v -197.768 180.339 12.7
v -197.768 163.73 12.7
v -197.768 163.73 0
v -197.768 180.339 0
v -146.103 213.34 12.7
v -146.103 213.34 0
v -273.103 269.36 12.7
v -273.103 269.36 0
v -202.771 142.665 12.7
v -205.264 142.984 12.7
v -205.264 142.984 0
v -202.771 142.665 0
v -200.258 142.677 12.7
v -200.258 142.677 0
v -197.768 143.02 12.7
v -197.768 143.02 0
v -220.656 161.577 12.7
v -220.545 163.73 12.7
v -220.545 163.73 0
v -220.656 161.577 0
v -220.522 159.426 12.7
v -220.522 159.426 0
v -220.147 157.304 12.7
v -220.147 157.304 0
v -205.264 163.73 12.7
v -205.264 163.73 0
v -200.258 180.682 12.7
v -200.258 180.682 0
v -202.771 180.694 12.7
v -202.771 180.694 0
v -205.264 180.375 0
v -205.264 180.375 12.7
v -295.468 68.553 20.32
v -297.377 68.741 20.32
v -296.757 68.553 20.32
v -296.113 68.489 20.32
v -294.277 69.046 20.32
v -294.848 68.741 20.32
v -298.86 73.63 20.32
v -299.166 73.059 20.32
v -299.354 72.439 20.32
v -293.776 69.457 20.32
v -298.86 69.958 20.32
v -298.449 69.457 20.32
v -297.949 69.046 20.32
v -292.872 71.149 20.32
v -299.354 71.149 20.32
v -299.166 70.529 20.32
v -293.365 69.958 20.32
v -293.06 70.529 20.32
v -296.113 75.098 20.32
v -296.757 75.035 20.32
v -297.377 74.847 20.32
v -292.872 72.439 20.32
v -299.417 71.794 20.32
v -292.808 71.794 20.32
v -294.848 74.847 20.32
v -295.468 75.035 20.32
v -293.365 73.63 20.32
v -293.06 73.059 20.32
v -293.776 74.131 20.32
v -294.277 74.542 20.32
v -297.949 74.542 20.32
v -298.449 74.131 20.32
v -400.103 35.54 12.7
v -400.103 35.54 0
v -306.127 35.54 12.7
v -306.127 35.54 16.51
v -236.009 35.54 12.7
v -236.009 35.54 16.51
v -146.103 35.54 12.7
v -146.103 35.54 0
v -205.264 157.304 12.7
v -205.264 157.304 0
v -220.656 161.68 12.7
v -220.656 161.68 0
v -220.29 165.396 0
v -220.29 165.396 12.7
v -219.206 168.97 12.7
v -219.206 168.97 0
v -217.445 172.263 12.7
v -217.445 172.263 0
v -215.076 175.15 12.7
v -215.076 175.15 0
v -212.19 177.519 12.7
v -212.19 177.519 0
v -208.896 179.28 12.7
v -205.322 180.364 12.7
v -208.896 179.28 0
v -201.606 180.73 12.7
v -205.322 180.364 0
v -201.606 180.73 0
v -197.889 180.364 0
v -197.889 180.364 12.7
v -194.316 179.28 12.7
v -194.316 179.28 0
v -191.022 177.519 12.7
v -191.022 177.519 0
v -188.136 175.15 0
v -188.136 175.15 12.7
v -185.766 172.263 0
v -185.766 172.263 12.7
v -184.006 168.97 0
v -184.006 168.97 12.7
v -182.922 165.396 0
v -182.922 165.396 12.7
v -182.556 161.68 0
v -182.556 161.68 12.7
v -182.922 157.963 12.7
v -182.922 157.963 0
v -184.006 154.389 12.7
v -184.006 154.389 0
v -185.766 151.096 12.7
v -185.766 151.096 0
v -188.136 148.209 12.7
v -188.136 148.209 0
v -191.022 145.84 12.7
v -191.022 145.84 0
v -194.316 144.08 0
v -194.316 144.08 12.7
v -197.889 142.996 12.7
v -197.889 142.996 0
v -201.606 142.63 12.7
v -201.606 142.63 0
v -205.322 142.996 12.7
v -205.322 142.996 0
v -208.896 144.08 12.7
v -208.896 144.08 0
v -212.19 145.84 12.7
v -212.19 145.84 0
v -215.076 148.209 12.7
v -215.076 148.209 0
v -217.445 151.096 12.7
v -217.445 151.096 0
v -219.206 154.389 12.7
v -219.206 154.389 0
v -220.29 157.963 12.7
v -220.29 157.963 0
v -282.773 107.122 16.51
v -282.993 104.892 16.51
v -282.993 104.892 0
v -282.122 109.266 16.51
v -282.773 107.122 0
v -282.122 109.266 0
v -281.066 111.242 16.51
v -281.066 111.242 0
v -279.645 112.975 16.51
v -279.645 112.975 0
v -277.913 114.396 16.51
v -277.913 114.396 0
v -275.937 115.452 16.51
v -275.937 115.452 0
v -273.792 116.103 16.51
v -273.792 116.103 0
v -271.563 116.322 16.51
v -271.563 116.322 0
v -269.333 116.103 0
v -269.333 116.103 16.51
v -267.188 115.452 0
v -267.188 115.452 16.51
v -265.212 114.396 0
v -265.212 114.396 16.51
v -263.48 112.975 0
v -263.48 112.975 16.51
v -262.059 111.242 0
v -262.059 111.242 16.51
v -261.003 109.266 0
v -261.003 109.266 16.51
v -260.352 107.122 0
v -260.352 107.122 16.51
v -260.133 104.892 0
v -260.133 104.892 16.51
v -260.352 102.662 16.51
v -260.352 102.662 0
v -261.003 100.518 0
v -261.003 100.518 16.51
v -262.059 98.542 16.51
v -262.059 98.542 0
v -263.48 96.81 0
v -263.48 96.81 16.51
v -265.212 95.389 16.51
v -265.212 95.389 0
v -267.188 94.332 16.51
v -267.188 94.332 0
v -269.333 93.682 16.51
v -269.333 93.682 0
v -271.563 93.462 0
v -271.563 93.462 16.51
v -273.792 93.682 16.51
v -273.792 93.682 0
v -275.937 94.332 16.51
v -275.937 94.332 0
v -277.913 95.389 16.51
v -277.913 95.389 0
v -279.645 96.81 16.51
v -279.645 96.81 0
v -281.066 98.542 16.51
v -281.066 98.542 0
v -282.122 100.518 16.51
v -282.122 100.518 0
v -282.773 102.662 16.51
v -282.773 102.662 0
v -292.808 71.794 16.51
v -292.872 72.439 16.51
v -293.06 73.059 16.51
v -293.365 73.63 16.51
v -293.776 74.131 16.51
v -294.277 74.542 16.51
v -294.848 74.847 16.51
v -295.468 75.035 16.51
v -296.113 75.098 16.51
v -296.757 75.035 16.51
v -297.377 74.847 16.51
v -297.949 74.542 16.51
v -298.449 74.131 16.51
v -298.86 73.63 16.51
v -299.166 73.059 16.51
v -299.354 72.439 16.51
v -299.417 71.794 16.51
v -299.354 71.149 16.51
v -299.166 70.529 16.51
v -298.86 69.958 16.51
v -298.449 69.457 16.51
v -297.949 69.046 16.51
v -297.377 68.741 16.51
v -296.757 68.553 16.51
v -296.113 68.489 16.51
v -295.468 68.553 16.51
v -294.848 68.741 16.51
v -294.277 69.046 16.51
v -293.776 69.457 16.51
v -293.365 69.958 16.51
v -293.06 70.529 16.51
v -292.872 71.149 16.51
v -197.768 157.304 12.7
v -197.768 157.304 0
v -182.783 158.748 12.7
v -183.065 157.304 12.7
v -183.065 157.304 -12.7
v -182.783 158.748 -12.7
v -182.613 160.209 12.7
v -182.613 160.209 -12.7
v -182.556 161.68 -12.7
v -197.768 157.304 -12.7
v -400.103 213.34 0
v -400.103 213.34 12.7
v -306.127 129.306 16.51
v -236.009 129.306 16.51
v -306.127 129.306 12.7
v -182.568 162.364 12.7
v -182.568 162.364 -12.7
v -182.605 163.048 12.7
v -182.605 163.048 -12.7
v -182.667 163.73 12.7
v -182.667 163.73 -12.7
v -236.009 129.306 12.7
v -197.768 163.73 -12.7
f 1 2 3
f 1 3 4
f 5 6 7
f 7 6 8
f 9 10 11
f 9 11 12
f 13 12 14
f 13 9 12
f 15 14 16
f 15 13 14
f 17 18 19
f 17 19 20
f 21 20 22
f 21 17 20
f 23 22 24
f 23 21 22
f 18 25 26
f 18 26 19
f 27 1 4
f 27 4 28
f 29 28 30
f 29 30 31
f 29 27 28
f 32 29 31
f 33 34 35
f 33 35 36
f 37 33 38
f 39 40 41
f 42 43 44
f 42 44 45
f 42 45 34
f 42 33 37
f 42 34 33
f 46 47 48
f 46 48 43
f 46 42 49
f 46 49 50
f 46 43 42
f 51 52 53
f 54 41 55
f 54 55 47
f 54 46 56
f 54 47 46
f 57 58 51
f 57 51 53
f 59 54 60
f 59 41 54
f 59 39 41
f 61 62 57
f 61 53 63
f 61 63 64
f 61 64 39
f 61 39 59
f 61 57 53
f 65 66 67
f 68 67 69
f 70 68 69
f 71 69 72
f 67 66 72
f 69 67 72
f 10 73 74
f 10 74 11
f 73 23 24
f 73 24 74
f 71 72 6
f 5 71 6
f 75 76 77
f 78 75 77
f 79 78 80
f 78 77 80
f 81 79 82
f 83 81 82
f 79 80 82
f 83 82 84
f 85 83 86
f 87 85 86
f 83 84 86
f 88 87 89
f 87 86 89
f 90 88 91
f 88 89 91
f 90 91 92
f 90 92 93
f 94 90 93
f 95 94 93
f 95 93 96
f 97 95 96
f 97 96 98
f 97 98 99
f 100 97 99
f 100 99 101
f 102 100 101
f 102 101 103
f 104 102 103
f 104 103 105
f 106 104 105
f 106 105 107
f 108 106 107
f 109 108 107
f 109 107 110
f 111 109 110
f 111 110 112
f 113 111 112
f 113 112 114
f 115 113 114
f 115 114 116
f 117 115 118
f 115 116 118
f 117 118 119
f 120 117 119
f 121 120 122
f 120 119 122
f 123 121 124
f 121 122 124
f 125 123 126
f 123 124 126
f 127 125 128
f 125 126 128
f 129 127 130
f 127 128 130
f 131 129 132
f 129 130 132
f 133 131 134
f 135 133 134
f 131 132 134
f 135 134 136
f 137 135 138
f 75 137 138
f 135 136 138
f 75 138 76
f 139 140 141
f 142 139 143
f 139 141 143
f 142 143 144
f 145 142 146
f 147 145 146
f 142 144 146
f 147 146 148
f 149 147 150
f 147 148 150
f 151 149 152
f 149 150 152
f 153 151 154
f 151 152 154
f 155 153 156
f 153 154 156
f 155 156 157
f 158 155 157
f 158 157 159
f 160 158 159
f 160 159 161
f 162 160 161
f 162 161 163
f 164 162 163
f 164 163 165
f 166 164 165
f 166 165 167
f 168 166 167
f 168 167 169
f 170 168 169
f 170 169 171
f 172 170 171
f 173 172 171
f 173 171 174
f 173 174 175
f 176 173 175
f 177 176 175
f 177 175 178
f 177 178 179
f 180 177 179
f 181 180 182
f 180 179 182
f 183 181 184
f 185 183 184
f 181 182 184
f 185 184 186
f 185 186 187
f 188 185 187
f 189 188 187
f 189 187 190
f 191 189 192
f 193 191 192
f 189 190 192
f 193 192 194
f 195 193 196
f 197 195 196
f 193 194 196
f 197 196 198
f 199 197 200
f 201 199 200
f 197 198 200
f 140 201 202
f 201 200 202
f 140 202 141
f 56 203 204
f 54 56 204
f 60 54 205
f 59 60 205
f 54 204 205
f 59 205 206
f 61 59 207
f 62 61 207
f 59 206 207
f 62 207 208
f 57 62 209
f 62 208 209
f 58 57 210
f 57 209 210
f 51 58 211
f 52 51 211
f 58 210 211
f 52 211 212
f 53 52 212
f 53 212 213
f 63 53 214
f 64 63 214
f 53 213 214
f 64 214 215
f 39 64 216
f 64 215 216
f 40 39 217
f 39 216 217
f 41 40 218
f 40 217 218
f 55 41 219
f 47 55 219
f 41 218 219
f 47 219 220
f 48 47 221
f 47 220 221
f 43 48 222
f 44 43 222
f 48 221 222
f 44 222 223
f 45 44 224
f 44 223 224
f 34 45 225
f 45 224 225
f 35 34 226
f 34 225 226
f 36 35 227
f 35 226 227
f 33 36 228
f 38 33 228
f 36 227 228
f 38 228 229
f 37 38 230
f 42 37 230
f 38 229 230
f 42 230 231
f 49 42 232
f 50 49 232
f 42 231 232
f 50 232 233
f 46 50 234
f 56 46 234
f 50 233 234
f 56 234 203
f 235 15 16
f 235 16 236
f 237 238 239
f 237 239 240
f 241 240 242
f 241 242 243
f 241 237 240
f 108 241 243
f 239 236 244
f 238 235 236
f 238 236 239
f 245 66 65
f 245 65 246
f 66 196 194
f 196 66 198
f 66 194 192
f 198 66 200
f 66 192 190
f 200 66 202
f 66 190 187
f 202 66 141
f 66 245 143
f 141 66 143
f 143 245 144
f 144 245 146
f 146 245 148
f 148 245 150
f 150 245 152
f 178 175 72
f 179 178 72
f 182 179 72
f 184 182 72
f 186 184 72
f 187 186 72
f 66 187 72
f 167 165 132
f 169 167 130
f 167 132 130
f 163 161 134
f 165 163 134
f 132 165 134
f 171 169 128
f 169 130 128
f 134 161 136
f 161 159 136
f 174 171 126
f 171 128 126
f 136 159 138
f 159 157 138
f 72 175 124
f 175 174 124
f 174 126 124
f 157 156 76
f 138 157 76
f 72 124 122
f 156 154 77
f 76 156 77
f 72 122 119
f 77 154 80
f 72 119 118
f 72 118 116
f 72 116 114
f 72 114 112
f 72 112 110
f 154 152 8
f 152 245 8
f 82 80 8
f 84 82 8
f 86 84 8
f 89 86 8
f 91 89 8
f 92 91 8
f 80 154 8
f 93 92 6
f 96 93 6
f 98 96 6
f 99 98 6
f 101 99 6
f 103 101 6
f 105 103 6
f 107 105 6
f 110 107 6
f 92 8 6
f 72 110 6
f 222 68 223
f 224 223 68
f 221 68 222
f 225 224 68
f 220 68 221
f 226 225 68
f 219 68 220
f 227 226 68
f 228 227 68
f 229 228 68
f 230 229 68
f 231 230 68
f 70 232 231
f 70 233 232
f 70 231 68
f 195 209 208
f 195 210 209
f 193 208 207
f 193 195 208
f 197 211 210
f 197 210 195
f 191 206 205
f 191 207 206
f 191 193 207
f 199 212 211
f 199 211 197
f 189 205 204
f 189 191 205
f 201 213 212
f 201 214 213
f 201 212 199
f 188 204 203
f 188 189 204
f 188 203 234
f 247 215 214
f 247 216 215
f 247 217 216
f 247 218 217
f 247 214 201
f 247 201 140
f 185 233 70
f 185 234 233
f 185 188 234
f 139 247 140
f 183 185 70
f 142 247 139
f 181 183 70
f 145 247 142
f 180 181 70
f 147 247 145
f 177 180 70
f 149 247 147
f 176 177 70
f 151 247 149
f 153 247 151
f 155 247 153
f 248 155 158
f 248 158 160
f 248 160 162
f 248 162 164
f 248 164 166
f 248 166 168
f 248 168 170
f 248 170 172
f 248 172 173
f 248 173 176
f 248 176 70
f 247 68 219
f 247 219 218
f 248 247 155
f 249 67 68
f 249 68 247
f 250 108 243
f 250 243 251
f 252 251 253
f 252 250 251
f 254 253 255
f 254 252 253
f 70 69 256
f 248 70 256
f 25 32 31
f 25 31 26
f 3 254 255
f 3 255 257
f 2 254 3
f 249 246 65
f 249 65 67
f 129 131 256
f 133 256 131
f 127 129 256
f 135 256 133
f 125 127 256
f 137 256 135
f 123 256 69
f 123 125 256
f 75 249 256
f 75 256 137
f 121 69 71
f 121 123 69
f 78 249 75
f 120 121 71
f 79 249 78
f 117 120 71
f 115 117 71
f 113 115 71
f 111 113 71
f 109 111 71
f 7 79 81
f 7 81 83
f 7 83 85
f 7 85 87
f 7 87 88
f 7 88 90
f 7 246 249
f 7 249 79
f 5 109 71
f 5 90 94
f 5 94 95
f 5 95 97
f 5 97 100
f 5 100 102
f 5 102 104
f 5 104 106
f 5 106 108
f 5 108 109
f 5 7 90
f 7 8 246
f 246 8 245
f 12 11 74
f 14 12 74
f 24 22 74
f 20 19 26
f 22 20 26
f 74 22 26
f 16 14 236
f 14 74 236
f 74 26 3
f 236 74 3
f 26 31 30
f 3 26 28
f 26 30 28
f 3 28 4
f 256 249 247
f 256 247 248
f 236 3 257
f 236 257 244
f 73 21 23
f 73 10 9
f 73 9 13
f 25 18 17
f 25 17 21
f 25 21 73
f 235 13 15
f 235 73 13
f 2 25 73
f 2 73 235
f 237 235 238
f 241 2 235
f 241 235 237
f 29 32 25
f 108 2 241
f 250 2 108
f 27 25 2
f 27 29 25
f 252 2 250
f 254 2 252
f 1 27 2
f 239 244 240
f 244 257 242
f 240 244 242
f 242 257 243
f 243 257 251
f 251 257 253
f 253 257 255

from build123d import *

# Parameters (mm, degrees)
F0_W      = 254
F0_H      = 177.8
F1_DEPTH  = 12.7
F3_D      = 38.1
F4_W      = 70.1176375151
F4_H      = 93.7658244599
F5_DEPTH  = 3.81
F7_D      = 22.86
F9_DEPTH  = 12.7
F8_W      = 7.4963332962
F8_H      = 6.4259641575
F10_DEPTH = 12.7
F11_DEPTH = 12.7
F12_DEPTH = 25.4
F13_DEPTH = 12.7
F14_R     = 3.3045515418
F15_DEPTH = 3.81


with BuildPart() as f1:
    # F0 (on Top) → F1 (new body)
    with BuildSketch(Plane.XY):
        with Locations((-273.1029465795, 124.4398064624)):
            Rectangle(F0_W, F0_H)
        Polygon((-273.1029465795, 269.3603634834), (-400.1029465795, 213.3398064624), (-146.1029465795, 213.3398064624), align=None)
    extrude(amount=F1_DEPTH)

    # F3 (through all)
    with Locations(Plane.XY.offset(12.7)):
        with Locations((-201.6059309244, 161.6795957088)):
            Hole(F3_D / 2)

    # F4 (on face) → F5 (join)
    with BuildSketch(Plane.XY.offset(12.7)):
        with Locations((-271.0681334138, 82.4227186924)):
            Rectangle(F4_W, F4_H)
    extrude(amount=F5_DEPTH)

    # F7 (through all)
    with Locations(Plane.XY.offset(16.51)):
        with Locations((-271.5625464916, 104.8922762275)):
            Hole(F7_D / 2)

    # F14 (on face) → F15 (join)
    with BuildSketch(Plane.XY.offset(16.51)):
        with Locations((-296.1127758026, 71.7939063907)):
            Circle(F14_R)
    extrude(amount=F15_DEPTH)


with BuildPart() as f9:
    # F8 (on face) → F9 (new body)
    with BuildSketch(Plane.XY.offset(12.7)):
        with BuildLine():
            ThreePointArc((-197.7681655949, 180.3390184565), (-201.514545885, 180.7293765153), (-205.2644988911, 180.3749796427))
            Line((-205.2644988911, 180.3749796427), (-205.2644988911, 163.7296213064))
            Line((-205.2644988911, 163.7296213064), (-197.7681655949, 163.7296213064))
            Line((-197.7681655949, 163.7296213064), (-197.7681655949, 180.3390184565))
        make_face()
    extrude(amount=-F9_DEPTH)

    # F8 (on face) → F10 (join)
    with BuildSketch(Plane.XY.offset(12.7)):
        with Locations((-201.516332243, 160.5166392277)):
            Rectangle(F8_W, F8_H)
    extrude(amount=-F10_DEPTH)

    # F8 (on face) → F11 (join)
    with BuildSketch(Plane.XY.offset(12.7)):
        with BuildLine():
            Line((-197.7681655949, 157.3036571489), (-205.2644988911, 157.3036571489))
            Line((-205.2644988911, 157.3036571489), (-205.2644988911, 142.984211775))
            ThreePointArc((-205.2644988911, 142.984211775), (-201.514545885, 142.6298149024), (-197.7681655949, 143.0201729612))
            Line((-197.7681655949, 143.0201729612), (-197.7681655949, 157.3036571489))
        make_face()
    extrude(amount=-F11_DEPTH)

    # F8 (on face) → F12 (join)
    with BuildSketch(Plane.XY.offset(12.7)):
        with BuildLine():
            Line((-182.6665567254, 163.7296213064), (-197.7681655949, 163.7296213064))
            Line((-197.7681655949, 163.7296213064), (-197.7681655949, 157.3036571489))
            Line((-197.7681655949, 157.3036571489), (-183.0653359577, 157.3036571489))
            ThreePointArc((-183.0653359577, 157.3036571489), (-182.6837107307, 159.4768512974), (-182.5559309244, 161.6795957088))
            ThreePointArc((-182.5559309244, 161.6795957088), (-182.5836074794, 162.7060998514), (-182.6665567254, 163.7296213064))
        make_face()
    extrude(amount=-F12_DEPTH)

    # F8 (on face) → F13 (join)
    with BuildSketch(Plane.XY.offset(12.7)):
        with BuildLine():
            Line((-205.2644988911, 157.3036571489), (-205.2644988911, 163.7296213064))
            Line((-205.2644988911, 163.7296213064), (-220.5453051234, 163.7296213064))
            ThreePointArc((-220.5453051234, 163.7296213064), (-220.6193544984, 160.4996702891), (-220.1465258911, 157.3036571489))
            Line((-220.1465258911, 157.3036571489), (-205.2644988911, 157.3036571489))
        make_face()
    extrude(amount=-F13_DEPTH)


solid = Compound([f1.part, f9.part])
